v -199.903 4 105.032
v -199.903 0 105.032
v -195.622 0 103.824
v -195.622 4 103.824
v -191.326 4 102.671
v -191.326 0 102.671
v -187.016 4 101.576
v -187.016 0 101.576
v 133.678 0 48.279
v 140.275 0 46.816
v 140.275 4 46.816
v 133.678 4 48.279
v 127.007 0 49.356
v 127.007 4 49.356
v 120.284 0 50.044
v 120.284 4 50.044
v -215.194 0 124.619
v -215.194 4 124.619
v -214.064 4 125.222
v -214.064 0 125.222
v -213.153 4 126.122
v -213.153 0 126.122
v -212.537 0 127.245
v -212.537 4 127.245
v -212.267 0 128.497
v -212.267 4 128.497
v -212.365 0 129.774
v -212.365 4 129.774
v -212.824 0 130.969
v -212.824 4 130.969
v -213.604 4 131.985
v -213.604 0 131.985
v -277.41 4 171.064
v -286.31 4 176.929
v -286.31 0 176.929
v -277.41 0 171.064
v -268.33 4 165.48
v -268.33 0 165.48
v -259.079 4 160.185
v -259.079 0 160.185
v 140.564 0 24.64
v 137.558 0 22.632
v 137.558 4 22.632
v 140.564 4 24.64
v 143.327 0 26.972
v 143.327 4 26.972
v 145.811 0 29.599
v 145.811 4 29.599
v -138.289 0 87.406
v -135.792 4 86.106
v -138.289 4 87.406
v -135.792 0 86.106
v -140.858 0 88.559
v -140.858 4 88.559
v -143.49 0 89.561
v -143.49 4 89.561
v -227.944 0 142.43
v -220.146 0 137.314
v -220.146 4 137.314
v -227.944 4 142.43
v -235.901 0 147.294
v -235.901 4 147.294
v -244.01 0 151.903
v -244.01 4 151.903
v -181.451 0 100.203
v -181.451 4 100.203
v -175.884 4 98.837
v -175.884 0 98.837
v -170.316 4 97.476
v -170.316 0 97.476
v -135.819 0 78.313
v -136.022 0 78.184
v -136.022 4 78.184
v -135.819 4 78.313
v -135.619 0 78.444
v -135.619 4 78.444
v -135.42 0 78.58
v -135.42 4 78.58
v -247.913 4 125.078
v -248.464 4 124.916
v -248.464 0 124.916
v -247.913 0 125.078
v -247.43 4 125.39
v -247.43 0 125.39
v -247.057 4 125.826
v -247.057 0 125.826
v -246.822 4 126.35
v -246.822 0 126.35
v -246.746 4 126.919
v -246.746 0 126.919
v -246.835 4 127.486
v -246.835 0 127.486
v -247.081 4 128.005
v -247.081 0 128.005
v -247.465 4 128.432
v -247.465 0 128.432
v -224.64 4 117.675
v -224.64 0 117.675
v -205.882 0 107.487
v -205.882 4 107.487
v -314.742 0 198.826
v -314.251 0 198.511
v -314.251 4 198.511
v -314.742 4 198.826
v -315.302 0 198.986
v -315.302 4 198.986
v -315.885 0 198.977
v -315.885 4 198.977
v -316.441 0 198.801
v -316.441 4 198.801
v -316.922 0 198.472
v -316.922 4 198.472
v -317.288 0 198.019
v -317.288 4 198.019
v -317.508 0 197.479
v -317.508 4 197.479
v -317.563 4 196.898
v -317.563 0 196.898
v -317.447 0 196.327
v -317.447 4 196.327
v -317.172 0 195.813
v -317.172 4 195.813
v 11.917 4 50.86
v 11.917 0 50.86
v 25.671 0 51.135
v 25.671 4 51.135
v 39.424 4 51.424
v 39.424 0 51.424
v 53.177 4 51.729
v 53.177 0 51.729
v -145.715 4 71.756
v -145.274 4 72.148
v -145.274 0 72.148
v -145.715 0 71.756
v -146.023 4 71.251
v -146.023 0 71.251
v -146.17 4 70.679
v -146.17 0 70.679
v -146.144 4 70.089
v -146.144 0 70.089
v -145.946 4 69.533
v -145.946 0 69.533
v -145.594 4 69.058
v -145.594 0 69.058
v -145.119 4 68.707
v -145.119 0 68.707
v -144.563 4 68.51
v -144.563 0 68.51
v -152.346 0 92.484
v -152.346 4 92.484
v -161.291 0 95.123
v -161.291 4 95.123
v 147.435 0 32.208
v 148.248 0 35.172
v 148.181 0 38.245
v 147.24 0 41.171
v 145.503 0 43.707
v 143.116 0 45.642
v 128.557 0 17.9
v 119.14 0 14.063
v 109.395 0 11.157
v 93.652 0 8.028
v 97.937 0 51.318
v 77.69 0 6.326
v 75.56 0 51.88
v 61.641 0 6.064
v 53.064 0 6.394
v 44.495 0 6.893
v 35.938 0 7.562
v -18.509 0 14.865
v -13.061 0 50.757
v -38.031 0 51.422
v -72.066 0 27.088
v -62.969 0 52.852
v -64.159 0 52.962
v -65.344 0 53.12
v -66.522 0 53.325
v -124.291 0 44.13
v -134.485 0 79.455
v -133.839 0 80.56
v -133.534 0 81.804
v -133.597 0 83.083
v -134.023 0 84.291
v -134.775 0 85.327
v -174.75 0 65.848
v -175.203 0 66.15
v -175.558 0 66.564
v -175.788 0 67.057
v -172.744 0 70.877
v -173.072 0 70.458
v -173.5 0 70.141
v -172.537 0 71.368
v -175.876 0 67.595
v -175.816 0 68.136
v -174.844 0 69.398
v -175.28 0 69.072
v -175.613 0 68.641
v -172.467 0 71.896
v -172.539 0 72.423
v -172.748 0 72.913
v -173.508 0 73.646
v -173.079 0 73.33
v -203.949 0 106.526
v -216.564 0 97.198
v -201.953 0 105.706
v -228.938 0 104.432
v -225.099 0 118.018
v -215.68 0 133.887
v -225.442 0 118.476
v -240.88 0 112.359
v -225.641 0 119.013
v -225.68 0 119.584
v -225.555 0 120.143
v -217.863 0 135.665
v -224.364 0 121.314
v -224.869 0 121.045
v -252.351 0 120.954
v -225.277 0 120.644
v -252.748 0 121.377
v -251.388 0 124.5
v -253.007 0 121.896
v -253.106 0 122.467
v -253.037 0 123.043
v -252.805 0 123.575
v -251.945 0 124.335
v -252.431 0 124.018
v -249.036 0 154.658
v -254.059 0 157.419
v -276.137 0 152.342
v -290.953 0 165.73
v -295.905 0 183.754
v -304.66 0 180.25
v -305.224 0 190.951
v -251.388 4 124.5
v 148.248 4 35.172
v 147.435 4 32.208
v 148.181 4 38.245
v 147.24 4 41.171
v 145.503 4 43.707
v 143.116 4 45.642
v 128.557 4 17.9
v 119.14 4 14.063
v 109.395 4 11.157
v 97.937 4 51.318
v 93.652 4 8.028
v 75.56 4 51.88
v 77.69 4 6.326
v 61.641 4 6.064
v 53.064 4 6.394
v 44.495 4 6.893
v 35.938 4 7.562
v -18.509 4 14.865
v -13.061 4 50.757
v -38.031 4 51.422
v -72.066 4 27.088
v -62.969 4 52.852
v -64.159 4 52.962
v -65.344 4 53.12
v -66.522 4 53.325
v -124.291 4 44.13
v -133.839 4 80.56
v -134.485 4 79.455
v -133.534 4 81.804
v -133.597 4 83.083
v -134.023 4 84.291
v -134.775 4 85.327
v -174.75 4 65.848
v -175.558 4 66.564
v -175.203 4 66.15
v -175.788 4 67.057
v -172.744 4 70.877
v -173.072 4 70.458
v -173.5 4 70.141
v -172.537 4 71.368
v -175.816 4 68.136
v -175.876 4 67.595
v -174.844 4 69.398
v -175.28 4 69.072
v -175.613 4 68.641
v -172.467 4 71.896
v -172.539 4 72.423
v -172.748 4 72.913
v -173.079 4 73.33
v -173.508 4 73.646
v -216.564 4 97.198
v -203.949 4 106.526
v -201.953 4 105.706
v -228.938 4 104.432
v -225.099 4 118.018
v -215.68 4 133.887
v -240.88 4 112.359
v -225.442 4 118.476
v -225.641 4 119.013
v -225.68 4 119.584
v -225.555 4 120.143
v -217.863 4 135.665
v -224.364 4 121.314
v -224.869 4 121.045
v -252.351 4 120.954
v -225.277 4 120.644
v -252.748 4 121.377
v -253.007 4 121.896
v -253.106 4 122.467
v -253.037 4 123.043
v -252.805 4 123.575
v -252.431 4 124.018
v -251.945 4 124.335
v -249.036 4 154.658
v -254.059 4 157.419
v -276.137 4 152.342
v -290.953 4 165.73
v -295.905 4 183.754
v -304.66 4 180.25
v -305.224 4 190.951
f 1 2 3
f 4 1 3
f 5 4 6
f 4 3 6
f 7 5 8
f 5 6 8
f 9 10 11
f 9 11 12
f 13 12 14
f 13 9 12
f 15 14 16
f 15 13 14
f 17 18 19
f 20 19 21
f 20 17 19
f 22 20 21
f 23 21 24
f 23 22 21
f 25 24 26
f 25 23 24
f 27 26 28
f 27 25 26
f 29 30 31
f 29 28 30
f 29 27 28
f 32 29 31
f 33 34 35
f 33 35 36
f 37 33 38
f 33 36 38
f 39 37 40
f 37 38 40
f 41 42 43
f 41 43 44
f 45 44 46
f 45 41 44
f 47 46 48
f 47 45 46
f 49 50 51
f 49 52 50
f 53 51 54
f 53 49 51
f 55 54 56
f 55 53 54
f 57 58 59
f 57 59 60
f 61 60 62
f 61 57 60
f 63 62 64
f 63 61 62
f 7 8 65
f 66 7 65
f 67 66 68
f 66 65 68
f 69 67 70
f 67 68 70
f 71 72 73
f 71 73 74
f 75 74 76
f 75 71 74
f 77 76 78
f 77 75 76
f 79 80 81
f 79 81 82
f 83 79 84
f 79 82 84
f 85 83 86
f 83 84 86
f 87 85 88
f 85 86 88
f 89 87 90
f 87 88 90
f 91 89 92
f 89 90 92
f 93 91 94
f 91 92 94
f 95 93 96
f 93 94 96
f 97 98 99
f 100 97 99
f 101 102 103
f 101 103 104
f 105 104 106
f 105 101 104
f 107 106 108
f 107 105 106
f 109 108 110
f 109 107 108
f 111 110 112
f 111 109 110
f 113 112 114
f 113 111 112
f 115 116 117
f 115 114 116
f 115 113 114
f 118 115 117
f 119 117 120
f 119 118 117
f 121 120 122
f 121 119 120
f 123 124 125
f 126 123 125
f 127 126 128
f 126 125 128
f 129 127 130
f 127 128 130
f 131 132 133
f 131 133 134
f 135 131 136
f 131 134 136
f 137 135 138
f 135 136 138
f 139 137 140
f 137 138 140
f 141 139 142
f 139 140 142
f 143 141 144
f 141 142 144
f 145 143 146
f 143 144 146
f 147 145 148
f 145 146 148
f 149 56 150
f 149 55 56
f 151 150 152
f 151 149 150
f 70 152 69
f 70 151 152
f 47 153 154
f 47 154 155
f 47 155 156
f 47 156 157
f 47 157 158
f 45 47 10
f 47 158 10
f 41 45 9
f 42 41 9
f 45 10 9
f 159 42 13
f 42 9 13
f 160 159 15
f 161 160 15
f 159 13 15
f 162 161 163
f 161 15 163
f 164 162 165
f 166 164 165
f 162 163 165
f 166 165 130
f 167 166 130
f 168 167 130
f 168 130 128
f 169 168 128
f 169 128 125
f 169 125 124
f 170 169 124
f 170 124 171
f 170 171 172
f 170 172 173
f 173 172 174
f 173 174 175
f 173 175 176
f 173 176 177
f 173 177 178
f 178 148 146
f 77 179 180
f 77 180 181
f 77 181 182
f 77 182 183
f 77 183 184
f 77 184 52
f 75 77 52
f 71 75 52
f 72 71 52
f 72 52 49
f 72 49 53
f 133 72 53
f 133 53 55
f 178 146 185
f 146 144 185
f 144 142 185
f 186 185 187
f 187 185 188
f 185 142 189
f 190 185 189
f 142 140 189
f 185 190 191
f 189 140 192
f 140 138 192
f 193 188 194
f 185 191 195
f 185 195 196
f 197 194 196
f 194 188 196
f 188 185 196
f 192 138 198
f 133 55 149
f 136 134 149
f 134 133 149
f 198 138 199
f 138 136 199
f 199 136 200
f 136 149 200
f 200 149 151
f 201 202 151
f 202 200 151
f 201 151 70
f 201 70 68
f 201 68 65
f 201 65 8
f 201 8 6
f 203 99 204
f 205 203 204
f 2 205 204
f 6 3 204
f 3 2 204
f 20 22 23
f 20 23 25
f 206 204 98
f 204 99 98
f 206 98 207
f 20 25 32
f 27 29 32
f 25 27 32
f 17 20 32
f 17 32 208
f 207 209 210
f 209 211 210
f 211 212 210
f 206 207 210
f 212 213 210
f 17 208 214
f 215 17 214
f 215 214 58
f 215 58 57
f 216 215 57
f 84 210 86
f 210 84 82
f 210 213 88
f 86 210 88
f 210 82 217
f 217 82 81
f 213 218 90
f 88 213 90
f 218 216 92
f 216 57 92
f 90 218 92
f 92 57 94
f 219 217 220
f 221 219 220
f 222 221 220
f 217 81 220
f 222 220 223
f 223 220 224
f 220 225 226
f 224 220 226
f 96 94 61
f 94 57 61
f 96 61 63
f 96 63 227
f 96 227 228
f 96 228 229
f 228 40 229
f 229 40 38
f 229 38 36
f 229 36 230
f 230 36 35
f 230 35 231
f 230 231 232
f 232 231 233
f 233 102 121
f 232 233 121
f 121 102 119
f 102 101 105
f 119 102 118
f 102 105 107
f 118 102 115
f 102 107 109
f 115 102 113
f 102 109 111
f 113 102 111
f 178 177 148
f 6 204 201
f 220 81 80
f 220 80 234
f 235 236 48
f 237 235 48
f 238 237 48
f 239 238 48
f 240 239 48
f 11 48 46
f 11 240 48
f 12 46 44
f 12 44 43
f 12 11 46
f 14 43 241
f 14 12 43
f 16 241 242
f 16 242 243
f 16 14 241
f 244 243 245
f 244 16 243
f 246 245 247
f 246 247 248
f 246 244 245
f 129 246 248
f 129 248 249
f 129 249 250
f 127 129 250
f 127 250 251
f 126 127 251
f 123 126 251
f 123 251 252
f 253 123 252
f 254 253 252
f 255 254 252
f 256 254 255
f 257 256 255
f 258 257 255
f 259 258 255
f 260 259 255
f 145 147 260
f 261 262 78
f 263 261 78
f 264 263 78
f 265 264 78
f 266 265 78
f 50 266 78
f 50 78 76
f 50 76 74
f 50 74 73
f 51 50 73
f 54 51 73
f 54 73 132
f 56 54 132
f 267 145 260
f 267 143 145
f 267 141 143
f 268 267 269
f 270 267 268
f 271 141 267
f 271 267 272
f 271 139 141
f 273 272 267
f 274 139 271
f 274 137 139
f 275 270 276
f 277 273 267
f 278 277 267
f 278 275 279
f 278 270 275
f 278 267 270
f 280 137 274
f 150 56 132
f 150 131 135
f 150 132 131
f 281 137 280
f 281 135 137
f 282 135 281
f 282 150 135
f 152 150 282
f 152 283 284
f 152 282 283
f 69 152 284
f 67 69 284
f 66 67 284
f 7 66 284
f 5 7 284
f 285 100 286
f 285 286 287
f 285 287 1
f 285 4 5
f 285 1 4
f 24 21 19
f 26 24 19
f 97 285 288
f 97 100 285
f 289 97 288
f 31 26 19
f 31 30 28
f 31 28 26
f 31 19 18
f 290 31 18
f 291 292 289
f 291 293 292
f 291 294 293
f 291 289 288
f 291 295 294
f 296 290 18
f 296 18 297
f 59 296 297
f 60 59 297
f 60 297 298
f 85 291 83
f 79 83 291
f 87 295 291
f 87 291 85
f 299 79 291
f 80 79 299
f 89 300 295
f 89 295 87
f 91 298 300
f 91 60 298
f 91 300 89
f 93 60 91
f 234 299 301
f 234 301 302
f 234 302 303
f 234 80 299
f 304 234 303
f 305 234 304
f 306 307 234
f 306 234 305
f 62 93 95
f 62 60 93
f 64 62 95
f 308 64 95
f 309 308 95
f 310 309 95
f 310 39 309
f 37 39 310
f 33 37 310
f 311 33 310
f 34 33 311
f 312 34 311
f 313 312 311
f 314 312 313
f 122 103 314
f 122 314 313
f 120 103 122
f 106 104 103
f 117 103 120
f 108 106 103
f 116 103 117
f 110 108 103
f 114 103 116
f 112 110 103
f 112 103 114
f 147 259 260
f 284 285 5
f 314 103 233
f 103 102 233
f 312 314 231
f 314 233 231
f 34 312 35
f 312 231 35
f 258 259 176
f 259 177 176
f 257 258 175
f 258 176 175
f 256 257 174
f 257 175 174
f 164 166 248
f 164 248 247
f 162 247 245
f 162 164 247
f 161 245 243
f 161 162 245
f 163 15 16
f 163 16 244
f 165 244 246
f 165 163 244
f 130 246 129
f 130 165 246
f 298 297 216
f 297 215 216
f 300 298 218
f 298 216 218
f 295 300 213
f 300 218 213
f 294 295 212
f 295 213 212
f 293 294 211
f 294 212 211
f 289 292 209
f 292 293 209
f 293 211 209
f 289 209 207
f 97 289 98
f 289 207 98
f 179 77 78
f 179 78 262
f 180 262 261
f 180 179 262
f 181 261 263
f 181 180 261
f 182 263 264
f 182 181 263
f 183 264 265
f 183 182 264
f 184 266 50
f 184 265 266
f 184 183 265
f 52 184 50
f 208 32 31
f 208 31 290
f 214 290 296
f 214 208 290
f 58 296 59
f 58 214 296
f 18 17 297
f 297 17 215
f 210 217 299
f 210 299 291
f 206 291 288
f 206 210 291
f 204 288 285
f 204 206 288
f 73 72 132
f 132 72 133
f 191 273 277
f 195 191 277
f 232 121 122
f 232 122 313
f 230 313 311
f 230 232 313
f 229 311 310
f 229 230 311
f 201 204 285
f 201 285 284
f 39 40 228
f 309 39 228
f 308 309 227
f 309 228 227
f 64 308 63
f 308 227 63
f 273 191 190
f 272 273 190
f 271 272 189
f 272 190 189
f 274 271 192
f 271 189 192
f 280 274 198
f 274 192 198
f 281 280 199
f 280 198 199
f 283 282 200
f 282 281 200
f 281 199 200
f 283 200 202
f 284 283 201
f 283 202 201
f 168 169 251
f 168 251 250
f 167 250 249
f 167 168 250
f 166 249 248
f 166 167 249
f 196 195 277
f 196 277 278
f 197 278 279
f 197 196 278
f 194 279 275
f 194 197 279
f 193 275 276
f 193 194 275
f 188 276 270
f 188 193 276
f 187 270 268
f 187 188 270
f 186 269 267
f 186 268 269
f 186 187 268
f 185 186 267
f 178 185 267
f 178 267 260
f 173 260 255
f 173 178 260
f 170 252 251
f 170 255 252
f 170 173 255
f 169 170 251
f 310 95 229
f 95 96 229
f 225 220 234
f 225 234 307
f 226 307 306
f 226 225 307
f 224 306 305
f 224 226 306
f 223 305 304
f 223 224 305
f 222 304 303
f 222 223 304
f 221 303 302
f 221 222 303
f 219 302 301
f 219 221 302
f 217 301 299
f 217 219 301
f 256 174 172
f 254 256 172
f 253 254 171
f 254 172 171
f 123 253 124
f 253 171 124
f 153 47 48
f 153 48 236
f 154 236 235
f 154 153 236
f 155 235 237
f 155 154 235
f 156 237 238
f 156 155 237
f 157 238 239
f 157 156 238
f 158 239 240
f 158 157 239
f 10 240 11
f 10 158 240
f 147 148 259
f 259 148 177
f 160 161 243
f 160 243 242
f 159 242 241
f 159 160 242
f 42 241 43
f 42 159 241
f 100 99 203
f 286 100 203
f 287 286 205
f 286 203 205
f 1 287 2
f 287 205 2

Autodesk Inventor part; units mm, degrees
ref_plane "YZ Plane" through (0, 0, 0) normal (1, 0, 0) x (0, 1, 0)
ref_plane "XZ Plane" through (0, 0, 0) normal (0, 1, 0) x (-1, 0, 0)
ref_plane "XY Plane" through (0, 0, 0) normal (0, 0, 1) x (1, 0, 0)
sketch "スケッチ1" plane through (0, 0, 0) normal (0, 1, 0) x (-1, 0, 0)
  arc A0 (317.1725, 195.8128) -> (314.2512, 198.5108) centre (315.5653, 197.0031) ccw projected
  arc A1 (259.4316, 139.5569) -> (317.1725, 195.8128) centre (115.0525, 345.5076) ccw projected
  arc A2 (250.4691, 133.6616) -> (259.4316, 139.5569) centre (155.393, 287.9636) ccw projected
  arc A3 (232.176, 125.5508) -> (250.4691, 133.6616) centre (211.4405, 197.0022) ccw projected
  arc A4 (219.6233, 123.8241) -> (232.176, 125.5508) centre (220.0183, 167.4446) ccw projected
  arc A5 (215.1935, 124.6186) -> (219.6233, 123.8241) centre (219.7448, 137.2497) ccw projected
  arc A6 (213.6042, 131.9847) -> (215.1935, 124.6186) centre (216.6995, 128.798) ccw projected
  arc A7 (220.1456, 137.3142) -> (213.6042, 131.9847) centre (247.3645, 97.227) ccw projected
  arc A8 (244.0097, 151.903) -> (220.1456, 137.3142) centre (384.6233, -104.9243) ccw projected
  arc A9 (244.0097, 151.903) -> (259.079, 160.1851) centre (-2315.4987, 4826.7805) ccw projected
  arc A10 (259.079, 160.1851) -> (286.3101, 176.9294) centre (95.2726, 457.0952) ccw projected
  arc A11 (286.3101, 176.9294) -> (314.2512, 198.5108) centre (118.2808, 423.3526) ccw projected
  arc A12 (252.3508, 120.9538) -> (250.2273, 124.316) centre (251.1064, 122.5195) ccw projected
  arc A13 (217.6526, 110.7016) -> (250.2273, 124.316) centre (119.1278, 392.2173) ccw projected
  arc A14 (187.0157, 101.5757) -> (217.6526, 110.7016) centre (105.6368, 430.7651) ccw projected
  arc A15 (170.3162, 97.476) -> (187.0157, 101.5757) centre (-1092.0317, 5275.5105) ccw projected
  arc A16 (170.3162, 97.476) -> (143.4895, 89.5609) centre (239.6668, -186.9935) ccw projected
  arc A17 (143.4895, 89.5609) -> (135.7916, 86.106) centre (159.4055, 43.7948) ccw projected
  arc A18 (135.7916, 86.106) -> (135.4203, 78.5795) centre (137.9566, 82.2268) ccw projected
  arc A19 (135.4203, 78.5795) -> (139.4934, 76.6657) centre (143.0857, 89.6023) ccw projected
  arc A20 (139.4934, 76.6657) -> (152.0654, 75.0846) centre (151.1648, 118.6976) ccw projected
  arc A21 (152.0654, 75.0846) -> (171.8343, 78.1844) centre (150.5294, 149.4681) ccw projected
  arc A22 (171.8343, 78.1844) -> (182.0173, 81.5592) centre (119.9342, 251.8363) ccw projected
  arc A23 (182.0173, 81.5592) -> (252.3508, 120.9538) centre (95.8618, 317.8604) ccw projected
  arc A24 (174.7503, 65.8482) -> (173.4237, 69.5954) centre (173.8768, 67.6474) ccw projected
  arc A25 (64.7746, 52.985) -> (173.4237, 69.5954) centre (11.2401, 766.801) ccw projected
  arc A26 (-11.9173, 50.8598) -> (64.7746, 52.985) centre (3.9096, 864.5436) ccw projected
  arc A27 (-53.1769, 51.7289) -> (-11.9173, 50.8598) centre (236.8377, 12839.6895) ccw projected
  arc A28 (-53.1769, 51.7289) -> (-120.2839, 50.0437) centre (-69.1096, -650.8128) ccw projected
  arc A29 (-120.2839, 50.0437) -> (-140.2753, 46.8162) centre (-111.8153, -65.9388) ccw projected
  arc A30 (-140.2753, 46.8162) -> (-145.8114, 29.5987) centre (-137.666, 36.4784) ccw projected
  arc A31 (-145.8114, 29.5987) -> (-137.5577, 22.6319) centre (-121.1943, 50.3906) ccw projected
  arc A32 (-137.5577, 22.6319) -> (-109.3953, 11.1574) centre (-84.3921, 112.8213) ccw projected
  arc A33 (-109.3953, 11.1574) -> (-61.641, 6.0637) centre (-66.7514, 184.549) ccw projected
  arc A34 (-61.641, 6.0637) -> (-35.9382, 7.5619) centre (-74.0904, 440.8658) ccw projected
  arc A35 (-35.9382, 7.5619) -> (174.7503, 65.8482) centre (-88.8837, 608.8772) ccw projected
  line L0 (244.0097, 125.5508) -> (251.3885, 124.4995)
  line L1 (215.1935, 124.6186) -> (228.5578, 119.8031)
  line L2 (228.5578, 119.8031) -> (203.0926, 105.9721)
  line L3 (216.5642, 97.1979) -> (170.3162, 71.9002)
  line L4 (170.3162, 71.9002) -> (174.8442, 69.3979)
  line L5 (136.0222, 78.1844) -> (149.4052, 69.4519)
  line L6 (149.4052, 69.4519) -> (64.7767, 52.9852)
  line L7 (244.0097, 125.5508) -> (276.1369, 152.3423)
  point P0 (0, 0)
extrude "押し出し1" add sketch "スケッチ1" along normal blind 4
fillet "フィレット1" radius 2 4 edges at (-228.5578, 2, 119.8031) (-149.4052, 2, 69.4519) (-244.0097, 2, 125.5508) (-170.3162, 2, 71.9002)
fillet "フィレット1" radius 30 2 edges at (-203.0926, 2, 105.9721) (-64.7767, 2, 52.9852)
properties part number "bracket2" material "木材 (オーク)"
